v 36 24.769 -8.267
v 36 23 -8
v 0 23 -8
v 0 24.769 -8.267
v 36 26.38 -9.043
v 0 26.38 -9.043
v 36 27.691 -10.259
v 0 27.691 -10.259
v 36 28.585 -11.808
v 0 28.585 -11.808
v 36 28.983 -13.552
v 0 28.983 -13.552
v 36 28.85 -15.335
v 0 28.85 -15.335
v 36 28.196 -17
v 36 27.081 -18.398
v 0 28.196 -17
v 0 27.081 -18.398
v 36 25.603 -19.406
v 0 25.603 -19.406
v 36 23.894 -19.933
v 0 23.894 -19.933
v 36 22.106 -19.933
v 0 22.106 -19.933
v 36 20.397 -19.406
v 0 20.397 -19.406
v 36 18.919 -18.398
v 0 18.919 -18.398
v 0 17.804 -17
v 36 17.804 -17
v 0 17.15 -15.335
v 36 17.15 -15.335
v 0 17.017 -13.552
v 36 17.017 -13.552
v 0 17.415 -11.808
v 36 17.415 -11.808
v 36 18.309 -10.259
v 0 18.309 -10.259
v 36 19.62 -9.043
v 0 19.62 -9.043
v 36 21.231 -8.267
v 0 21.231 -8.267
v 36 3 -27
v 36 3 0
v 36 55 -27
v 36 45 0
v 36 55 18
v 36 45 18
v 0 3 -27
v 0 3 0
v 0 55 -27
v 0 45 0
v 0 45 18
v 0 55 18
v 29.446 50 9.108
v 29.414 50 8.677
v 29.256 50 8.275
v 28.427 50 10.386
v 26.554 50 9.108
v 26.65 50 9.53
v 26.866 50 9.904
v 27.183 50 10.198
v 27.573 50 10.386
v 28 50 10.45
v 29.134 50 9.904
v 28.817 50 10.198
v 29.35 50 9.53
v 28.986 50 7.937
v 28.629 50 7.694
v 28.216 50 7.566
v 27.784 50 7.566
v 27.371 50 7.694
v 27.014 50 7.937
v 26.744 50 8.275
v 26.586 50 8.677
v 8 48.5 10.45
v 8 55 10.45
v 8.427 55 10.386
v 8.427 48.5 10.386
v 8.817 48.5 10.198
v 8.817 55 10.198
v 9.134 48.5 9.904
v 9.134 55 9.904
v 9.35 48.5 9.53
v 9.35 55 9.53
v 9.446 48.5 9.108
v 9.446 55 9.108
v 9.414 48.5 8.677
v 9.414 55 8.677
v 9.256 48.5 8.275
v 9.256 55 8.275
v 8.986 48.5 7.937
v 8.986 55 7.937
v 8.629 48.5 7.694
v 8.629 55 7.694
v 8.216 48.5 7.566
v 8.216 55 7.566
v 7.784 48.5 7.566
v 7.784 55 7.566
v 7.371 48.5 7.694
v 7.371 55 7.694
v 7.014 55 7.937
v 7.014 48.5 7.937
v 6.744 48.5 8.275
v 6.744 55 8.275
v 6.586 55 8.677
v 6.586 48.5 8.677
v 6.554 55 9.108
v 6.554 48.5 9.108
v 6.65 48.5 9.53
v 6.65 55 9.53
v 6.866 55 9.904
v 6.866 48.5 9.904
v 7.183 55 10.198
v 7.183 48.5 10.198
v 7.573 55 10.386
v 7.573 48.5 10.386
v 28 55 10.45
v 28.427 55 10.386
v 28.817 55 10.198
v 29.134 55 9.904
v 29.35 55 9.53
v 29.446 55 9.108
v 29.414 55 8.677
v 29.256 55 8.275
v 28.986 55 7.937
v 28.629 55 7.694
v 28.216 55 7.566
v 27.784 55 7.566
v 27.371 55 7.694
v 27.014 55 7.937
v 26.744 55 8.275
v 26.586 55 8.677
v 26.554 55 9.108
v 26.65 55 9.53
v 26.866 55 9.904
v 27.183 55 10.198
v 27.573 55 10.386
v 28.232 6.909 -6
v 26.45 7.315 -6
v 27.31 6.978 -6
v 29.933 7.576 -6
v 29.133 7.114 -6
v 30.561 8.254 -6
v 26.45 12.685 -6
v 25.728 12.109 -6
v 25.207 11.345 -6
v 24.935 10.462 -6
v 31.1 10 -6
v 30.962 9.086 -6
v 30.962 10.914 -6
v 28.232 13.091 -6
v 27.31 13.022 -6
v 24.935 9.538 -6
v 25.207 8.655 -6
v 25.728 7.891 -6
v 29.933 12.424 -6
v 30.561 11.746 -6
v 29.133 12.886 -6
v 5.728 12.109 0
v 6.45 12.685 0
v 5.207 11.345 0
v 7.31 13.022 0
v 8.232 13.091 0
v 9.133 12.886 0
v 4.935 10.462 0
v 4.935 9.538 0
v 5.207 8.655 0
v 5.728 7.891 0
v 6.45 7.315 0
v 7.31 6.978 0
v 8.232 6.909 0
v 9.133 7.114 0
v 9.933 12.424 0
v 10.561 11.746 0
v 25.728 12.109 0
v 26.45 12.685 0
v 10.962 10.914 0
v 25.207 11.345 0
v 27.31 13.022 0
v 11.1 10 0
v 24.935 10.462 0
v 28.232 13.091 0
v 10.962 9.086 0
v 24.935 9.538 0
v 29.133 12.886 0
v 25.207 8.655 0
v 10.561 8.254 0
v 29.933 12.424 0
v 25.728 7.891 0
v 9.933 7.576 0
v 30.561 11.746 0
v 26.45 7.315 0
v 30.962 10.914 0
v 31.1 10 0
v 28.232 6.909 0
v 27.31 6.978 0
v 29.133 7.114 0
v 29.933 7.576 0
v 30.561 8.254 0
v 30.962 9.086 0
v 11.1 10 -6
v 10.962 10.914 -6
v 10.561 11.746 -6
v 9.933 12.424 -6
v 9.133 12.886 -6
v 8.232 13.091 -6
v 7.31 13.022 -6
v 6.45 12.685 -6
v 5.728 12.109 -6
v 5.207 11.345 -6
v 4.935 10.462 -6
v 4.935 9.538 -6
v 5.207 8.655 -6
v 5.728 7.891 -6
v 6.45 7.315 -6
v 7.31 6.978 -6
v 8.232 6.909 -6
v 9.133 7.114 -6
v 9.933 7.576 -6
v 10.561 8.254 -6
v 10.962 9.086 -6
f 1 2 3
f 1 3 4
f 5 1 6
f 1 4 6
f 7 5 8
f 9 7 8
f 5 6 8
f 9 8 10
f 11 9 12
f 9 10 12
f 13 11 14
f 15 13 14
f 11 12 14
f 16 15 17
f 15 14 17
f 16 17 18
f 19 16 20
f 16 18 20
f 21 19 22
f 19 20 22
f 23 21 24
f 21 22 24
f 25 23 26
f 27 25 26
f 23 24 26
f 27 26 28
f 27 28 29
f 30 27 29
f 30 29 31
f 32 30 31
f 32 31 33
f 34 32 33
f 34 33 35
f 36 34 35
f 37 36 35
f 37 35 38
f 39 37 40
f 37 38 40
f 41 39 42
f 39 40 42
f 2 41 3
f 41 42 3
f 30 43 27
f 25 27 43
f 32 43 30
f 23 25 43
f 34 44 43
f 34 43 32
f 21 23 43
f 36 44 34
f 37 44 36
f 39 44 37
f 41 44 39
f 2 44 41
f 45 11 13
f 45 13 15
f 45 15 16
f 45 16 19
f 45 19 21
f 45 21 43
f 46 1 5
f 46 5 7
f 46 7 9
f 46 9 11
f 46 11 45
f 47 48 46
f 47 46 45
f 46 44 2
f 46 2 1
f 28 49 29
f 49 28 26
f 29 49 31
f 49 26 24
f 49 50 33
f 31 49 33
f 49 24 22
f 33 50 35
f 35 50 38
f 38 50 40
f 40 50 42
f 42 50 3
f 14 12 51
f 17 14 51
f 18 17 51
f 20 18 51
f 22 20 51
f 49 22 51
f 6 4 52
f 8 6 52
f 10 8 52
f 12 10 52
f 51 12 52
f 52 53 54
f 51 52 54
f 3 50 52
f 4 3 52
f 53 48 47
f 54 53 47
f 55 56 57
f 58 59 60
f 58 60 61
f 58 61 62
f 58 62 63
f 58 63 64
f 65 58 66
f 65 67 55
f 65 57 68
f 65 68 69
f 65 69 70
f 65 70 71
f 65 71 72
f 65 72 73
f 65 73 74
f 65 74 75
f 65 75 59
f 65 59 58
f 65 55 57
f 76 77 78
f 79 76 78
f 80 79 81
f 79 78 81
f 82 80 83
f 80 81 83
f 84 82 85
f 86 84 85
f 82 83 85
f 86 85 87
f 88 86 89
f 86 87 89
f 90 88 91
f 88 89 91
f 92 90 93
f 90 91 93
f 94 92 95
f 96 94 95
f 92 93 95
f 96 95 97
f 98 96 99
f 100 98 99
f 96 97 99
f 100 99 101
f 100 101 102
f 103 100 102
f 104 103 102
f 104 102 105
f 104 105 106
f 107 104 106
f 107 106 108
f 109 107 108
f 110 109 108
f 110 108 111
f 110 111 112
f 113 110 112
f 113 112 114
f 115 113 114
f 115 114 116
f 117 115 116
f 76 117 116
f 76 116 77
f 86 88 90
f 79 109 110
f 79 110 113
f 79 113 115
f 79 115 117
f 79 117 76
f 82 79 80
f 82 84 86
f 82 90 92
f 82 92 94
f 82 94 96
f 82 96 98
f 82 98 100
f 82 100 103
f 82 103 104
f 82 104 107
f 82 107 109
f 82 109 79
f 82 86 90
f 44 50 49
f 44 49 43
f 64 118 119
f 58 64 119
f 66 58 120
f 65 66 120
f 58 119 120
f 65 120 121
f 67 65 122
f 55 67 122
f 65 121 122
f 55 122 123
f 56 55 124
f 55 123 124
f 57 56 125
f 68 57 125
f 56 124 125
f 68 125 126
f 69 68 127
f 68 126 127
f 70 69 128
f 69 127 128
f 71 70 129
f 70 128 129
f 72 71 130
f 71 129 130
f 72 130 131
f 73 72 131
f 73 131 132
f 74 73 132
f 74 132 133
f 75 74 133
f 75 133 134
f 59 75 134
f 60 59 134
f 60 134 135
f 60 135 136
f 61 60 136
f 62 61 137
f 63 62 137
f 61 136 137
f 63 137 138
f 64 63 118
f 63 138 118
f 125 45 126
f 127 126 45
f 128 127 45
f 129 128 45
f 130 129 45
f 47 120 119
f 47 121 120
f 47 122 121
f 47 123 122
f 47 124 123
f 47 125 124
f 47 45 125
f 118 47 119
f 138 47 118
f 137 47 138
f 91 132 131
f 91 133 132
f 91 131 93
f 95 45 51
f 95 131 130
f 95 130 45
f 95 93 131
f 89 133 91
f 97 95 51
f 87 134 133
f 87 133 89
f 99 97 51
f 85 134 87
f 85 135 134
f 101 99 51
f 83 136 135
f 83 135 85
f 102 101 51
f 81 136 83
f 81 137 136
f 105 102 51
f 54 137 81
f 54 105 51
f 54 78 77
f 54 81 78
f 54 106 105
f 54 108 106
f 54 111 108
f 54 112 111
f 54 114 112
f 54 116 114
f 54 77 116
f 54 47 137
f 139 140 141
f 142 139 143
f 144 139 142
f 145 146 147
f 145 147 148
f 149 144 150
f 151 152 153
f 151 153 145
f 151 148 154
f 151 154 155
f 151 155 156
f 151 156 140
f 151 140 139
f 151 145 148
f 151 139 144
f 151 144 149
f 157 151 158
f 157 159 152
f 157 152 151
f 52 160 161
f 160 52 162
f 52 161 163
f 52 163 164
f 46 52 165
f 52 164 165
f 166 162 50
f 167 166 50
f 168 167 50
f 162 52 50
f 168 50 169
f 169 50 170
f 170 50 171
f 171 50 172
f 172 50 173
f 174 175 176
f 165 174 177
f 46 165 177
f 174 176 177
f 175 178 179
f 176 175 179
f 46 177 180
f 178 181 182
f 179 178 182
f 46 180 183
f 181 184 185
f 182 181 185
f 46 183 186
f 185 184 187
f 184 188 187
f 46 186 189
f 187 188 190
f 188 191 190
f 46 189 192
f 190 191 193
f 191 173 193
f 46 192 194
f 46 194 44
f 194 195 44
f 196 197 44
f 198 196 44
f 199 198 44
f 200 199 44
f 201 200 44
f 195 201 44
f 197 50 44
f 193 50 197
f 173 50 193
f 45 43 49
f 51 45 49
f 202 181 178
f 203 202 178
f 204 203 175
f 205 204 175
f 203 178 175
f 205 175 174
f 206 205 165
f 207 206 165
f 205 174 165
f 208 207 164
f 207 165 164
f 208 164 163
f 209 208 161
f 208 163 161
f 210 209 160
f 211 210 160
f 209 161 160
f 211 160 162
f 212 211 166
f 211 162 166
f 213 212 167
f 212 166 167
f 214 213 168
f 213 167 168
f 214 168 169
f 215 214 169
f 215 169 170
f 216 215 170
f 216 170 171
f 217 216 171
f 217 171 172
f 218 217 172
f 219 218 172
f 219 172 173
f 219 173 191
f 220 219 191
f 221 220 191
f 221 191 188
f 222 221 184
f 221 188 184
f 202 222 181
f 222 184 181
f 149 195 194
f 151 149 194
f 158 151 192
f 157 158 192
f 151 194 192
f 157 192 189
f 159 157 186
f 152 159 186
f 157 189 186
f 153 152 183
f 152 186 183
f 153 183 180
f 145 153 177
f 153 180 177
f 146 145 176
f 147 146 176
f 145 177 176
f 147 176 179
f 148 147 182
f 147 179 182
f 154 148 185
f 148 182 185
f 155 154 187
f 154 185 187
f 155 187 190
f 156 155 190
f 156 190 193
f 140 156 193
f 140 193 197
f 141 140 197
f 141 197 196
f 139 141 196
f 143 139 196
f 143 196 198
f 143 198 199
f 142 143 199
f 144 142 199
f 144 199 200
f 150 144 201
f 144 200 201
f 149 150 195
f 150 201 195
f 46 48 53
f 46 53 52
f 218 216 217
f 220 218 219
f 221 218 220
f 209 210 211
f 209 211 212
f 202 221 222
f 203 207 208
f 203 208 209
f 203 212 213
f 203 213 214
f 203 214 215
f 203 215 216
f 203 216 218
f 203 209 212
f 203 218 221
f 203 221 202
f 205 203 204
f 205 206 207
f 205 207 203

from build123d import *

# Parameters (mm, degrees)
SKETCH_1_W          = 36
SKETCH_1_H          = 24
EXTRUDE_1_DEPTH     = 55
SKETCH_2_R          = 6
CUT_EXTRUDE_1_DEPTH = 36
SKETCH_3_R          = 3.1
CUT_EXTRUDE_2_DEPTH = 6
SKETCH_5_W          = 18
SKETCH_5_H          = 10
EXTRUDE_2_DEPTH     = 36
SKETCH_6_R          = 1.45
CUT_EXTRUDE_3_DEPTH = 5
SKETCH_7_W          = 36
SKETCH_7_H          = 55
EXTRUDE_3_DEPTH     = 3
SKETCH_8_W          = 36
SKETCH_8_H          = 27
CUT_EXTRUDE_4_DEPTH = 3
SKETCH_9_R          = 1.45
CUT_EXTRUDE_5_DEPTH = 1.5


with BuildPart() as part:
    # 草图1 → 凸台-拉伸1 (new body)
    with BuildSketch(Plane(origin=(0, 0, 0), x_dir=(1, 0, 0), z_dir=(0, 1, 0))):
        with Locations((18, 12)):
            Rectangle(SKETCH_1_W, SKETCH_1_H)
    extrude(amount=EXTRUDE_1_DEPTH)

    # 草图2 → 切除-拉伸1 (cut)
    with BuildSketch(Plane.ZY):
        with Locations((-14, 23)):
            Circle(SKETCH_2_R)
    extrude(amount=-CUT_EXTRUDE_1_DEPTH, mode=Mode.SUBTRACT)

    # 草图3 → 切除-拉伸2 (cut)
    with BuildSketch(Plane.XY):
        with Locations((8, 10)):
            Circle(SKETCH_3_R)
        with Locations((28, 10)):
            Circle(SKETCH_3_R)
    extrude(amount=-CUT_EXTRUDE_2_DEPTH, mode=Mode.SUBTRACT)

    # 草图5 → 凸台-拉伸2 (add)
    with BuildSketch(Plane(origin=(36, 0, 0), x_dir=(0, 0, -1), z_dir=(1, 0, 0))):
        with Locations((-9, 50)):
            Rectangle(SKETCH_5_W, SKETCH_5_H)
    extrude(amount=-EXTRUDE_2_DEPTH)

    # 草图6 → 切除-拉伸3 (cut)
    with BuildSketch(Plane(origin=(0, 55, 0), x_dir=(1, 0, 0), z_dir=(0, 1, 0))):
        with Locations(Location((28, -9, 0), (0, 0, 270))):
            Circle(SKETCH_6_R)
        with Locations(Location((8, -9, 0), (0, 0, 270))):
            Circle(SKETCH_6_R)
    extrude(amount=-CUT_EXTRUDE_3_DEPTH, mode=Mode.SUBTRACT)

    # 草图7 → 凸台-拉伸3 (add)
    with BuildSketch(Plane(origin=(0, 0, -24), x_dir=(-1, 0, 0), z_dir=(0, 0, -1))):
        with Locations((-18, 27.5)):
            Rectangle(SKETCH_7_W, SKETCH_7_H)
    extrude(amount=EXTRUDE_3_DEPTH)

    # 草图8 → 切除-拉伸4 (cut)
    with BuildSketch(Plane.XZ):
        with Locations((18, -13.5)):
            Rectangle(SKETCH_8_W, SKETCH_8_H)
    extrude(amount=-CUT_EXTRUDE_4_DEPTH, mode=Mode.SUBTRACT)

    # 草图9 → 切除-拉伸5 (cut)
    with BuildSketch(Plane(origin=(0, 50, 0), x_dir=(1, 0, 0), z_dir=(0, 1, 0))):
        with Locations(Location((8, -9, 0), (0, 0, 270))):
            Circle(SKETCH_9_R)
    extrude(amount=-CUT_EXTRUDE_5_DEPTH, mode=Mode.SUBTRACT)


solid = part.part
